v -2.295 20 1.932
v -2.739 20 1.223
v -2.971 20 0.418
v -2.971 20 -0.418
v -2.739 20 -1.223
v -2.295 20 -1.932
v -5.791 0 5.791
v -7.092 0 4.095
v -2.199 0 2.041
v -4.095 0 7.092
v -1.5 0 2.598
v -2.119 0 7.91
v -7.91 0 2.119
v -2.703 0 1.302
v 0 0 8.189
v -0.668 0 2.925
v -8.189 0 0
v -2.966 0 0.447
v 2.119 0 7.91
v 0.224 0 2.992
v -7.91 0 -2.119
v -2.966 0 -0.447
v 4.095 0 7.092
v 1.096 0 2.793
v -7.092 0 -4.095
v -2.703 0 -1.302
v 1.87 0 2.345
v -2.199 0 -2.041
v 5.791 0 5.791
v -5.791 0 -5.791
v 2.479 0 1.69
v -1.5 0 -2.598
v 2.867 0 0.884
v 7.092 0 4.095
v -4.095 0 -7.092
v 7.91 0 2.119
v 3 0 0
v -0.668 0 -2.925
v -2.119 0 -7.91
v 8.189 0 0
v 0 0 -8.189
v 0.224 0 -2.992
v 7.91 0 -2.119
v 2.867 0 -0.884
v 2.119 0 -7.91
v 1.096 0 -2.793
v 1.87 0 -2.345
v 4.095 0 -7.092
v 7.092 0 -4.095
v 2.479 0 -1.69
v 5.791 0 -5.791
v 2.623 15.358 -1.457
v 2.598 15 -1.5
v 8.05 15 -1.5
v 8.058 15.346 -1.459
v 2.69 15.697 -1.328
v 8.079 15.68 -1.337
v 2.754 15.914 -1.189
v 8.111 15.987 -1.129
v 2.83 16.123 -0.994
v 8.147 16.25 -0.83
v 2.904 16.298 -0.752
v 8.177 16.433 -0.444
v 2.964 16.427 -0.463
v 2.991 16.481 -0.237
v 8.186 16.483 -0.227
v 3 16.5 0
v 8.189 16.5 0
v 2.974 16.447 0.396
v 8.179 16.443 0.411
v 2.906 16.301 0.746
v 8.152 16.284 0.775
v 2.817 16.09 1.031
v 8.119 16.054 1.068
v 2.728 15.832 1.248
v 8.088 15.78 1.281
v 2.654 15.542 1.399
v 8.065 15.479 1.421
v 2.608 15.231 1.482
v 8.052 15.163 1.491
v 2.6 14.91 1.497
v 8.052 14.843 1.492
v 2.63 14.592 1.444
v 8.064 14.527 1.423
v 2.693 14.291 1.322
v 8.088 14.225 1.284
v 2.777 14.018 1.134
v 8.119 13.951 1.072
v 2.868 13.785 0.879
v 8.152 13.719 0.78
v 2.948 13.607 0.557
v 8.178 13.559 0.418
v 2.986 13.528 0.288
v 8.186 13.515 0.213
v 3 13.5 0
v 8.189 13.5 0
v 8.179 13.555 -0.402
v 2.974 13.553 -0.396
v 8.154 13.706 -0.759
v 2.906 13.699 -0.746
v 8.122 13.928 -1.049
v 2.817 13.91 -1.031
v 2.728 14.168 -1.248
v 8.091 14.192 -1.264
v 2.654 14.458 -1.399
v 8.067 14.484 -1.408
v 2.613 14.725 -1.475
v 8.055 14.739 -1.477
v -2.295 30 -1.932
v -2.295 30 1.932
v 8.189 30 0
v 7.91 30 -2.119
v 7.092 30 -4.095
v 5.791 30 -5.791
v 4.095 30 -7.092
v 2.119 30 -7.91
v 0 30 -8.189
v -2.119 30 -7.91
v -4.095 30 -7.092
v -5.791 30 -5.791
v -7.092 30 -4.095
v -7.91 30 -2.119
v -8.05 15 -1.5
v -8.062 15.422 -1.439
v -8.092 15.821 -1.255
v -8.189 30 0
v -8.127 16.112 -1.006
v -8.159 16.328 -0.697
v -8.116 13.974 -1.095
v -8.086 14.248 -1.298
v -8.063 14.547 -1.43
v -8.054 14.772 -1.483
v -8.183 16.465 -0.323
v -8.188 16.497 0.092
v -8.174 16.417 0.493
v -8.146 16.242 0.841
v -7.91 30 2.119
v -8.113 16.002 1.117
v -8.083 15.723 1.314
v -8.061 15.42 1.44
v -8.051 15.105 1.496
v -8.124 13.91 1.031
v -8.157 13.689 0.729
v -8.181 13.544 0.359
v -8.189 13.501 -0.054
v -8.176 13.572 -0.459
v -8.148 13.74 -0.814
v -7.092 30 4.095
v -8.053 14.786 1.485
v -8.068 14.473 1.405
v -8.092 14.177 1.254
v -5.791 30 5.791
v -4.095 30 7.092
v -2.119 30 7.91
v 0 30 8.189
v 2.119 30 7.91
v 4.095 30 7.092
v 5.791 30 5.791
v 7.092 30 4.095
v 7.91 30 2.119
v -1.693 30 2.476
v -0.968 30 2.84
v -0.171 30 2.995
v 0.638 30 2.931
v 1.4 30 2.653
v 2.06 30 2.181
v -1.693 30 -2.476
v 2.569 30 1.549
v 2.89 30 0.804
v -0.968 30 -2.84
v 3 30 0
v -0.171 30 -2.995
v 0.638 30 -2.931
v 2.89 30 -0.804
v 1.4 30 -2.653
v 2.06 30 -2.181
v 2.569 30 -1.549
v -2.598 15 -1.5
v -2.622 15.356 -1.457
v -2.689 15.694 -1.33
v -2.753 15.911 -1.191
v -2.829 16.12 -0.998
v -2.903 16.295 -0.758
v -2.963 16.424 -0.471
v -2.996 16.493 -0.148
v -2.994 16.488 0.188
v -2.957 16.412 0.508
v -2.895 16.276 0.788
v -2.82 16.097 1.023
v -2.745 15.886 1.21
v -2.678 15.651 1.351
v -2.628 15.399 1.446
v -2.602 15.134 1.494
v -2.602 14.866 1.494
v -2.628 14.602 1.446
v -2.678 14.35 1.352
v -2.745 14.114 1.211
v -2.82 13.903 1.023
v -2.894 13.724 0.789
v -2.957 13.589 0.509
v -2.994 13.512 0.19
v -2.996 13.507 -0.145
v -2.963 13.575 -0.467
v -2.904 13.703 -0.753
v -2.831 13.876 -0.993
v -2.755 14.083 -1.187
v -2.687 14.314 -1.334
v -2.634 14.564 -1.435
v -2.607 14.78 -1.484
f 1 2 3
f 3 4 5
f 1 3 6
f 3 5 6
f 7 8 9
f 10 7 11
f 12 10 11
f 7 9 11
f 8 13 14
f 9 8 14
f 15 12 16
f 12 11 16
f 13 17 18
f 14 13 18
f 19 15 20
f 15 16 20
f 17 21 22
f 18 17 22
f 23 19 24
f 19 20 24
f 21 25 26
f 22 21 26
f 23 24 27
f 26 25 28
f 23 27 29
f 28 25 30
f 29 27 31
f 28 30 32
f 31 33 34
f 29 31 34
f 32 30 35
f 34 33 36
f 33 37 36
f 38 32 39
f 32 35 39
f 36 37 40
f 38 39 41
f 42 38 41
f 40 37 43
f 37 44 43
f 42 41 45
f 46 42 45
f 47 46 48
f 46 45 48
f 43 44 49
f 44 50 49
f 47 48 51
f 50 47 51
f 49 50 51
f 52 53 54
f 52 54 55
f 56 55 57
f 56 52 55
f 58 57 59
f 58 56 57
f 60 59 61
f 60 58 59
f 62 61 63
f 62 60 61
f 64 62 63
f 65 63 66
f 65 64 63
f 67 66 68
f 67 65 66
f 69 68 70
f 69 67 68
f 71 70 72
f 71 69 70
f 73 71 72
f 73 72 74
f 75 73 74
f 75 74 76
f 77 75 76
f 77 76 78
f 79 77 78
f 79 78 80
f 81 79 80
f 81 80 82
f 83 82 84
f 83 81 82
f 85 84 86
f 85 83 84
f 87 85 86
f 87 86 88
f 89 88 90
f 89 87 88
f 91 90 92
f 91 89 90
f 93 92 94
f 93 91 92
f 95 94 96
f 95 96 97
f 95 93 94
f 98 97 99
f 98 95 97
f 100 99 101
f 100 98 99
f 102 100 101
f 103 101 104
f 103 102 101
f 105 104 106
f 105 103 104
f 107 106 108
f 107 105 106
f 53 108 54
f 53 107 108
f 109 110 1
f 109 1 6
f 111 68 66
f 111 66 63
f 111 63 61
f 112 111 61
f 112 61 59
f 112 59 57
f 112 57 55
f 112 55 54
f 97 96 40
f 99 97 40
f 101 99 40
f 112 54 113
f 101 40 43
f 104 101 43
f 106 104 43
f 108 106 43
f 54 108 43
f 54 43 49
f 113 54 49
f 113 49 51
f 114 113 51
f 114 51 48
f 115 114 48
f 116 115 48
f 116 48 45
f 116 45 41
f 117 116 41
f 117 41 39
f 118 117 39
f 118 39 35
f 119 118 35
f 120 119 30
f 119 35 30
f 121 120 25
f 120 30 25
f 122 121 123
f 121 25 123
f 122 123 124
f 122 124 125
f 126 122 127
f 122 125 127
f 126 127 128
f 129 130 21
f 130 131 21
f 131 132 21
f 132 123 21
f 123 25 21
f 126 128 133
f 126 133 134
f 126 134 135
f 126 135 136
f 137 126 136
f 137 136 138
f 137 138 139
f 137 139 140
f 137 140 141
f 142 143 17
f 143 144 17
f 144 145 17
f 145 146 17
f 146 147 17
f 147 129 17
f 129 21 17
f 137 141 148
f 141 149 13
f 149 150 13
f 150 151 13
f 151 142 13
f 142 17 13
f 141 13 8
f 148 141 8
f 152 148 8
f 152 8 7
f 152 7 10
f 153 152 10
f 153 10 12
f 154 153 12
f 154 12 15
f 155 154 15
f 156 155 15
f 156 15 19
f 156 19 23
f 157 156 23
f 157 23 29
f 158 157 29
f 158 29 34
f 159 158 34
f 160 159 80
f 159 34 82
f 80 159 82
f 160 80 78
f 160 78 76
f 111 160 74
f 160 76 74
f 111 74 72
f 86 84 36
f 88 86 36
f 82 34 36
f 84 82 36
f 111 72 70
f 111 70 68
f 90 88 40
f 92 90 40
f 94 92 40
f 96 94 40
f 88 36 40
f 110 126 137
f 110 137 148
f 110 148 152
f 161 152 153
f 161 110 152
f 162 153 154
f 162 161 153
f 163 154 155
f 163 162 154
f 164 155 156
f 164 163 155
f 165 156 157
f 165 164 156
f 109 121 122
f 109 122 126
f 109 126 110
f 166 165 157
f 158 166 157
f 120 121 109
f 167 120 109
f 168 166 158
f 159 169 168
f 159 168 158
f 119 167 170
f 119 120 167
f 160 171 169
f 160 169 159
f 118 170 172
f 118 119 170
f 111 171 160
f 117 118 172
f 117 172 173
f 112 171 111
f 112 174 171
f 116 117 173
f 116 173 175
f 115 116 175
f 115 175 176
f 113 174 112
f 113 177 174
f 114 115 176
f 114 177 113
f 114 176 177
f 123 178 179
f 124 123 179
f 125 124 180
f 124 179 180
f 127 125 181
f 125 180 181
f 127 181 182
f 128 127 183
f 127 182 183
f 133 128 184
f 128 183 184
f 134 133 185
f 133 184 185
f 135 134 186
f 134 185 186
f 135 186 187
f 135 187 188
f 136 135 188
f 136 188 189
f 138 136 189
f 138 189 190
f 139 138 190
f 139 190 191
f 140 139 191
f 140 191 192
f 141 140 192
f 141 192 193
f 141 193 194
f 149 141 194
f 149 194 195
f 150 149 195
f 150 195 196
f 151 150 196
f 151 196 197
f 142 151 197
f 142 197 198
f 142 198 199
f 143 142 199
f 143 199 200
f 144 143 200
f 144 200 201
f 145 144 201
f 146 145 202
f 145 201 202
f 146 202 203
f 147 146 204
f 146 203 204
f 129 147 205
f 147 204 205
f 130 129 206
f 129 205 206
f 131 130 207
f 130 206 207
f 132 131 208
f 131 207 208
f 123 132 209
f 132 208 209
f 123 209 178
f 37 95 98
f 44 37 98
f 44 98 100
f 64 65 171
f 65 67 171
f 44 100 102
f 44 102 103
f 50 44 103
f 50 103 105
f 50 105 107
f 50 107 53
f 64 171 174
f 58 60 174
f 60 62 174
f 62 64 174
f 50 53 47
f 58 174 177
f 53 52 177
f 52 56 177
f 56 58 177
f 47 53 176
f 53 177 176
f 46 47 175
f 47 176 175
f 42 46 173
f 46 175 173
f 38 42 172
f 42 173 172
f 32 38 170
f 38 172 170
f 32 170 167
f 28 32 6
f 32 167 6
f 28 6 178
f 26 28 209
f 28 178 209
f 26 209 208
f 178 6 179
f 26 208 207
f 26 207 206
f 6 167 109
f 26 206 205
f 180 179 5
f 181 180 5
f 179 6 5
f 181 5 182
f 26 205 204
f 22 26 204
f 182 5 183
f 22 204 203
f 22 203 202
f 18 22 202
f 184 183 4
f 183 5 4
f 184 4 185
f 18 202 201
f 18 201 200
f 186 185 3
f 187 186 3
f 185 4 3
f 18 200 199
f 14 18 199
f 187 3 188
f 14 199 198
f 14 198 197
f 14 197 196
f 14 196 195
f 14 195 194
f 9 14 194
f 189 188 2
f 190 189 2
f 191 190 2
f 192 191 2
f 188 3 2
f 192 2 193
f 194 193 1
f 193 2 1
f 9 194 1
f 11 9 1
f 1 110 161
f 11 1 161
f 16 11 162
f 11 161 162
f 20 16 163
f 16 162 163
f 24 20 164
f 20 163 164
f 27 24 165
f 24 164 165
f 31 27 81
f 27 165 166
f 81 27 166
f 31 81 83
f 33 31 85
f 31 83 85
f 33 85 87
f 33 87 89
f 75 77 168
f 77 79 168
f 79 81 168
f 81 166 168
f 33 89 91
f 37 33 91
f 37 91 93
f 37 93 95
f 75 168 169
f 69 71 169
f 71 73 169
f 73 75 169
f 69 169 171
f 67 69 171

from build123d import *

# Parameters (mm, degrees)
SKETCH1_R               = 8.189006913
BOSS_EXTRUDE1_DEPTH     = 30
SKETCH2_R               = 3
CUT_EXTRUDE1_DEPTH      = 30
SKETCH4_W               = 1.839212521
SKETCH4_H               = 4.190652527
BOSS_EXTRUDE2_DEPTH     = 10
CUT_EXTRUDE2_DEPTH      = 10
CUT_EXTRUDE2_DEPTH_BACK = 10
SKETCH3_R               = 1.5


with BuildPart() as part:
    # Sketch1 → Boss-Extrude1 (new body)
    with BuildSketch(Plane(origin=(0, 0, 0), x_dir=(1, 0, 0), z_dir=(0, 1, 0))):
        Circle(SKETCH1_R)
    extrude(amount=BOSS_EXTRUDE1_DEPTH)

    # Sketch2 → Cut-Extrude1 (cut)
    with BuildSketch(Plane(origin=(0, 30, 0), x_dir=(1, 0, 0), z_dir=(0, 1, 0))):
        Circle(SKETCH2_R)
    extrude(amount=-CUT_EXTRUDE1_DEPTH, mode=Mode.SUBTRACT)

    # Sketch4 → Boss-Extrude2 (add)
    with BuildSketch(Plane(origin=(0, 30, 0), x_dir=(1, 0, 0), z_dir=(0, 1, 0))):
        with Locations((-3.214713917, 0.163363311)):
            Rectangle(SKETCH4_W, SKETCH4_H)
    extrude(amount=-BOSS_EXTRUDE2_DEPTH)

    # Sketch3 → Cut-Extrude2 (cut, two sides: drawn at the far end of the back side and taken through both)
    with BuildSketch(Plane(origin=(0, 0, 0), x_dir=(0, 0, -1), z_dir=(1, 0, 0)).offset(-CUT_EXTRUDE2_DEPTH_BACK)):
        with Locations((0, 15)):
            Circle(SKETCH3_R)
    extrude(amount=CUT_EXTRUDE2_DEPTH + CUT_EXTRUDE2_DEPTH_BACK, mode=Mode.SUBTRACT)


solid = part.part
